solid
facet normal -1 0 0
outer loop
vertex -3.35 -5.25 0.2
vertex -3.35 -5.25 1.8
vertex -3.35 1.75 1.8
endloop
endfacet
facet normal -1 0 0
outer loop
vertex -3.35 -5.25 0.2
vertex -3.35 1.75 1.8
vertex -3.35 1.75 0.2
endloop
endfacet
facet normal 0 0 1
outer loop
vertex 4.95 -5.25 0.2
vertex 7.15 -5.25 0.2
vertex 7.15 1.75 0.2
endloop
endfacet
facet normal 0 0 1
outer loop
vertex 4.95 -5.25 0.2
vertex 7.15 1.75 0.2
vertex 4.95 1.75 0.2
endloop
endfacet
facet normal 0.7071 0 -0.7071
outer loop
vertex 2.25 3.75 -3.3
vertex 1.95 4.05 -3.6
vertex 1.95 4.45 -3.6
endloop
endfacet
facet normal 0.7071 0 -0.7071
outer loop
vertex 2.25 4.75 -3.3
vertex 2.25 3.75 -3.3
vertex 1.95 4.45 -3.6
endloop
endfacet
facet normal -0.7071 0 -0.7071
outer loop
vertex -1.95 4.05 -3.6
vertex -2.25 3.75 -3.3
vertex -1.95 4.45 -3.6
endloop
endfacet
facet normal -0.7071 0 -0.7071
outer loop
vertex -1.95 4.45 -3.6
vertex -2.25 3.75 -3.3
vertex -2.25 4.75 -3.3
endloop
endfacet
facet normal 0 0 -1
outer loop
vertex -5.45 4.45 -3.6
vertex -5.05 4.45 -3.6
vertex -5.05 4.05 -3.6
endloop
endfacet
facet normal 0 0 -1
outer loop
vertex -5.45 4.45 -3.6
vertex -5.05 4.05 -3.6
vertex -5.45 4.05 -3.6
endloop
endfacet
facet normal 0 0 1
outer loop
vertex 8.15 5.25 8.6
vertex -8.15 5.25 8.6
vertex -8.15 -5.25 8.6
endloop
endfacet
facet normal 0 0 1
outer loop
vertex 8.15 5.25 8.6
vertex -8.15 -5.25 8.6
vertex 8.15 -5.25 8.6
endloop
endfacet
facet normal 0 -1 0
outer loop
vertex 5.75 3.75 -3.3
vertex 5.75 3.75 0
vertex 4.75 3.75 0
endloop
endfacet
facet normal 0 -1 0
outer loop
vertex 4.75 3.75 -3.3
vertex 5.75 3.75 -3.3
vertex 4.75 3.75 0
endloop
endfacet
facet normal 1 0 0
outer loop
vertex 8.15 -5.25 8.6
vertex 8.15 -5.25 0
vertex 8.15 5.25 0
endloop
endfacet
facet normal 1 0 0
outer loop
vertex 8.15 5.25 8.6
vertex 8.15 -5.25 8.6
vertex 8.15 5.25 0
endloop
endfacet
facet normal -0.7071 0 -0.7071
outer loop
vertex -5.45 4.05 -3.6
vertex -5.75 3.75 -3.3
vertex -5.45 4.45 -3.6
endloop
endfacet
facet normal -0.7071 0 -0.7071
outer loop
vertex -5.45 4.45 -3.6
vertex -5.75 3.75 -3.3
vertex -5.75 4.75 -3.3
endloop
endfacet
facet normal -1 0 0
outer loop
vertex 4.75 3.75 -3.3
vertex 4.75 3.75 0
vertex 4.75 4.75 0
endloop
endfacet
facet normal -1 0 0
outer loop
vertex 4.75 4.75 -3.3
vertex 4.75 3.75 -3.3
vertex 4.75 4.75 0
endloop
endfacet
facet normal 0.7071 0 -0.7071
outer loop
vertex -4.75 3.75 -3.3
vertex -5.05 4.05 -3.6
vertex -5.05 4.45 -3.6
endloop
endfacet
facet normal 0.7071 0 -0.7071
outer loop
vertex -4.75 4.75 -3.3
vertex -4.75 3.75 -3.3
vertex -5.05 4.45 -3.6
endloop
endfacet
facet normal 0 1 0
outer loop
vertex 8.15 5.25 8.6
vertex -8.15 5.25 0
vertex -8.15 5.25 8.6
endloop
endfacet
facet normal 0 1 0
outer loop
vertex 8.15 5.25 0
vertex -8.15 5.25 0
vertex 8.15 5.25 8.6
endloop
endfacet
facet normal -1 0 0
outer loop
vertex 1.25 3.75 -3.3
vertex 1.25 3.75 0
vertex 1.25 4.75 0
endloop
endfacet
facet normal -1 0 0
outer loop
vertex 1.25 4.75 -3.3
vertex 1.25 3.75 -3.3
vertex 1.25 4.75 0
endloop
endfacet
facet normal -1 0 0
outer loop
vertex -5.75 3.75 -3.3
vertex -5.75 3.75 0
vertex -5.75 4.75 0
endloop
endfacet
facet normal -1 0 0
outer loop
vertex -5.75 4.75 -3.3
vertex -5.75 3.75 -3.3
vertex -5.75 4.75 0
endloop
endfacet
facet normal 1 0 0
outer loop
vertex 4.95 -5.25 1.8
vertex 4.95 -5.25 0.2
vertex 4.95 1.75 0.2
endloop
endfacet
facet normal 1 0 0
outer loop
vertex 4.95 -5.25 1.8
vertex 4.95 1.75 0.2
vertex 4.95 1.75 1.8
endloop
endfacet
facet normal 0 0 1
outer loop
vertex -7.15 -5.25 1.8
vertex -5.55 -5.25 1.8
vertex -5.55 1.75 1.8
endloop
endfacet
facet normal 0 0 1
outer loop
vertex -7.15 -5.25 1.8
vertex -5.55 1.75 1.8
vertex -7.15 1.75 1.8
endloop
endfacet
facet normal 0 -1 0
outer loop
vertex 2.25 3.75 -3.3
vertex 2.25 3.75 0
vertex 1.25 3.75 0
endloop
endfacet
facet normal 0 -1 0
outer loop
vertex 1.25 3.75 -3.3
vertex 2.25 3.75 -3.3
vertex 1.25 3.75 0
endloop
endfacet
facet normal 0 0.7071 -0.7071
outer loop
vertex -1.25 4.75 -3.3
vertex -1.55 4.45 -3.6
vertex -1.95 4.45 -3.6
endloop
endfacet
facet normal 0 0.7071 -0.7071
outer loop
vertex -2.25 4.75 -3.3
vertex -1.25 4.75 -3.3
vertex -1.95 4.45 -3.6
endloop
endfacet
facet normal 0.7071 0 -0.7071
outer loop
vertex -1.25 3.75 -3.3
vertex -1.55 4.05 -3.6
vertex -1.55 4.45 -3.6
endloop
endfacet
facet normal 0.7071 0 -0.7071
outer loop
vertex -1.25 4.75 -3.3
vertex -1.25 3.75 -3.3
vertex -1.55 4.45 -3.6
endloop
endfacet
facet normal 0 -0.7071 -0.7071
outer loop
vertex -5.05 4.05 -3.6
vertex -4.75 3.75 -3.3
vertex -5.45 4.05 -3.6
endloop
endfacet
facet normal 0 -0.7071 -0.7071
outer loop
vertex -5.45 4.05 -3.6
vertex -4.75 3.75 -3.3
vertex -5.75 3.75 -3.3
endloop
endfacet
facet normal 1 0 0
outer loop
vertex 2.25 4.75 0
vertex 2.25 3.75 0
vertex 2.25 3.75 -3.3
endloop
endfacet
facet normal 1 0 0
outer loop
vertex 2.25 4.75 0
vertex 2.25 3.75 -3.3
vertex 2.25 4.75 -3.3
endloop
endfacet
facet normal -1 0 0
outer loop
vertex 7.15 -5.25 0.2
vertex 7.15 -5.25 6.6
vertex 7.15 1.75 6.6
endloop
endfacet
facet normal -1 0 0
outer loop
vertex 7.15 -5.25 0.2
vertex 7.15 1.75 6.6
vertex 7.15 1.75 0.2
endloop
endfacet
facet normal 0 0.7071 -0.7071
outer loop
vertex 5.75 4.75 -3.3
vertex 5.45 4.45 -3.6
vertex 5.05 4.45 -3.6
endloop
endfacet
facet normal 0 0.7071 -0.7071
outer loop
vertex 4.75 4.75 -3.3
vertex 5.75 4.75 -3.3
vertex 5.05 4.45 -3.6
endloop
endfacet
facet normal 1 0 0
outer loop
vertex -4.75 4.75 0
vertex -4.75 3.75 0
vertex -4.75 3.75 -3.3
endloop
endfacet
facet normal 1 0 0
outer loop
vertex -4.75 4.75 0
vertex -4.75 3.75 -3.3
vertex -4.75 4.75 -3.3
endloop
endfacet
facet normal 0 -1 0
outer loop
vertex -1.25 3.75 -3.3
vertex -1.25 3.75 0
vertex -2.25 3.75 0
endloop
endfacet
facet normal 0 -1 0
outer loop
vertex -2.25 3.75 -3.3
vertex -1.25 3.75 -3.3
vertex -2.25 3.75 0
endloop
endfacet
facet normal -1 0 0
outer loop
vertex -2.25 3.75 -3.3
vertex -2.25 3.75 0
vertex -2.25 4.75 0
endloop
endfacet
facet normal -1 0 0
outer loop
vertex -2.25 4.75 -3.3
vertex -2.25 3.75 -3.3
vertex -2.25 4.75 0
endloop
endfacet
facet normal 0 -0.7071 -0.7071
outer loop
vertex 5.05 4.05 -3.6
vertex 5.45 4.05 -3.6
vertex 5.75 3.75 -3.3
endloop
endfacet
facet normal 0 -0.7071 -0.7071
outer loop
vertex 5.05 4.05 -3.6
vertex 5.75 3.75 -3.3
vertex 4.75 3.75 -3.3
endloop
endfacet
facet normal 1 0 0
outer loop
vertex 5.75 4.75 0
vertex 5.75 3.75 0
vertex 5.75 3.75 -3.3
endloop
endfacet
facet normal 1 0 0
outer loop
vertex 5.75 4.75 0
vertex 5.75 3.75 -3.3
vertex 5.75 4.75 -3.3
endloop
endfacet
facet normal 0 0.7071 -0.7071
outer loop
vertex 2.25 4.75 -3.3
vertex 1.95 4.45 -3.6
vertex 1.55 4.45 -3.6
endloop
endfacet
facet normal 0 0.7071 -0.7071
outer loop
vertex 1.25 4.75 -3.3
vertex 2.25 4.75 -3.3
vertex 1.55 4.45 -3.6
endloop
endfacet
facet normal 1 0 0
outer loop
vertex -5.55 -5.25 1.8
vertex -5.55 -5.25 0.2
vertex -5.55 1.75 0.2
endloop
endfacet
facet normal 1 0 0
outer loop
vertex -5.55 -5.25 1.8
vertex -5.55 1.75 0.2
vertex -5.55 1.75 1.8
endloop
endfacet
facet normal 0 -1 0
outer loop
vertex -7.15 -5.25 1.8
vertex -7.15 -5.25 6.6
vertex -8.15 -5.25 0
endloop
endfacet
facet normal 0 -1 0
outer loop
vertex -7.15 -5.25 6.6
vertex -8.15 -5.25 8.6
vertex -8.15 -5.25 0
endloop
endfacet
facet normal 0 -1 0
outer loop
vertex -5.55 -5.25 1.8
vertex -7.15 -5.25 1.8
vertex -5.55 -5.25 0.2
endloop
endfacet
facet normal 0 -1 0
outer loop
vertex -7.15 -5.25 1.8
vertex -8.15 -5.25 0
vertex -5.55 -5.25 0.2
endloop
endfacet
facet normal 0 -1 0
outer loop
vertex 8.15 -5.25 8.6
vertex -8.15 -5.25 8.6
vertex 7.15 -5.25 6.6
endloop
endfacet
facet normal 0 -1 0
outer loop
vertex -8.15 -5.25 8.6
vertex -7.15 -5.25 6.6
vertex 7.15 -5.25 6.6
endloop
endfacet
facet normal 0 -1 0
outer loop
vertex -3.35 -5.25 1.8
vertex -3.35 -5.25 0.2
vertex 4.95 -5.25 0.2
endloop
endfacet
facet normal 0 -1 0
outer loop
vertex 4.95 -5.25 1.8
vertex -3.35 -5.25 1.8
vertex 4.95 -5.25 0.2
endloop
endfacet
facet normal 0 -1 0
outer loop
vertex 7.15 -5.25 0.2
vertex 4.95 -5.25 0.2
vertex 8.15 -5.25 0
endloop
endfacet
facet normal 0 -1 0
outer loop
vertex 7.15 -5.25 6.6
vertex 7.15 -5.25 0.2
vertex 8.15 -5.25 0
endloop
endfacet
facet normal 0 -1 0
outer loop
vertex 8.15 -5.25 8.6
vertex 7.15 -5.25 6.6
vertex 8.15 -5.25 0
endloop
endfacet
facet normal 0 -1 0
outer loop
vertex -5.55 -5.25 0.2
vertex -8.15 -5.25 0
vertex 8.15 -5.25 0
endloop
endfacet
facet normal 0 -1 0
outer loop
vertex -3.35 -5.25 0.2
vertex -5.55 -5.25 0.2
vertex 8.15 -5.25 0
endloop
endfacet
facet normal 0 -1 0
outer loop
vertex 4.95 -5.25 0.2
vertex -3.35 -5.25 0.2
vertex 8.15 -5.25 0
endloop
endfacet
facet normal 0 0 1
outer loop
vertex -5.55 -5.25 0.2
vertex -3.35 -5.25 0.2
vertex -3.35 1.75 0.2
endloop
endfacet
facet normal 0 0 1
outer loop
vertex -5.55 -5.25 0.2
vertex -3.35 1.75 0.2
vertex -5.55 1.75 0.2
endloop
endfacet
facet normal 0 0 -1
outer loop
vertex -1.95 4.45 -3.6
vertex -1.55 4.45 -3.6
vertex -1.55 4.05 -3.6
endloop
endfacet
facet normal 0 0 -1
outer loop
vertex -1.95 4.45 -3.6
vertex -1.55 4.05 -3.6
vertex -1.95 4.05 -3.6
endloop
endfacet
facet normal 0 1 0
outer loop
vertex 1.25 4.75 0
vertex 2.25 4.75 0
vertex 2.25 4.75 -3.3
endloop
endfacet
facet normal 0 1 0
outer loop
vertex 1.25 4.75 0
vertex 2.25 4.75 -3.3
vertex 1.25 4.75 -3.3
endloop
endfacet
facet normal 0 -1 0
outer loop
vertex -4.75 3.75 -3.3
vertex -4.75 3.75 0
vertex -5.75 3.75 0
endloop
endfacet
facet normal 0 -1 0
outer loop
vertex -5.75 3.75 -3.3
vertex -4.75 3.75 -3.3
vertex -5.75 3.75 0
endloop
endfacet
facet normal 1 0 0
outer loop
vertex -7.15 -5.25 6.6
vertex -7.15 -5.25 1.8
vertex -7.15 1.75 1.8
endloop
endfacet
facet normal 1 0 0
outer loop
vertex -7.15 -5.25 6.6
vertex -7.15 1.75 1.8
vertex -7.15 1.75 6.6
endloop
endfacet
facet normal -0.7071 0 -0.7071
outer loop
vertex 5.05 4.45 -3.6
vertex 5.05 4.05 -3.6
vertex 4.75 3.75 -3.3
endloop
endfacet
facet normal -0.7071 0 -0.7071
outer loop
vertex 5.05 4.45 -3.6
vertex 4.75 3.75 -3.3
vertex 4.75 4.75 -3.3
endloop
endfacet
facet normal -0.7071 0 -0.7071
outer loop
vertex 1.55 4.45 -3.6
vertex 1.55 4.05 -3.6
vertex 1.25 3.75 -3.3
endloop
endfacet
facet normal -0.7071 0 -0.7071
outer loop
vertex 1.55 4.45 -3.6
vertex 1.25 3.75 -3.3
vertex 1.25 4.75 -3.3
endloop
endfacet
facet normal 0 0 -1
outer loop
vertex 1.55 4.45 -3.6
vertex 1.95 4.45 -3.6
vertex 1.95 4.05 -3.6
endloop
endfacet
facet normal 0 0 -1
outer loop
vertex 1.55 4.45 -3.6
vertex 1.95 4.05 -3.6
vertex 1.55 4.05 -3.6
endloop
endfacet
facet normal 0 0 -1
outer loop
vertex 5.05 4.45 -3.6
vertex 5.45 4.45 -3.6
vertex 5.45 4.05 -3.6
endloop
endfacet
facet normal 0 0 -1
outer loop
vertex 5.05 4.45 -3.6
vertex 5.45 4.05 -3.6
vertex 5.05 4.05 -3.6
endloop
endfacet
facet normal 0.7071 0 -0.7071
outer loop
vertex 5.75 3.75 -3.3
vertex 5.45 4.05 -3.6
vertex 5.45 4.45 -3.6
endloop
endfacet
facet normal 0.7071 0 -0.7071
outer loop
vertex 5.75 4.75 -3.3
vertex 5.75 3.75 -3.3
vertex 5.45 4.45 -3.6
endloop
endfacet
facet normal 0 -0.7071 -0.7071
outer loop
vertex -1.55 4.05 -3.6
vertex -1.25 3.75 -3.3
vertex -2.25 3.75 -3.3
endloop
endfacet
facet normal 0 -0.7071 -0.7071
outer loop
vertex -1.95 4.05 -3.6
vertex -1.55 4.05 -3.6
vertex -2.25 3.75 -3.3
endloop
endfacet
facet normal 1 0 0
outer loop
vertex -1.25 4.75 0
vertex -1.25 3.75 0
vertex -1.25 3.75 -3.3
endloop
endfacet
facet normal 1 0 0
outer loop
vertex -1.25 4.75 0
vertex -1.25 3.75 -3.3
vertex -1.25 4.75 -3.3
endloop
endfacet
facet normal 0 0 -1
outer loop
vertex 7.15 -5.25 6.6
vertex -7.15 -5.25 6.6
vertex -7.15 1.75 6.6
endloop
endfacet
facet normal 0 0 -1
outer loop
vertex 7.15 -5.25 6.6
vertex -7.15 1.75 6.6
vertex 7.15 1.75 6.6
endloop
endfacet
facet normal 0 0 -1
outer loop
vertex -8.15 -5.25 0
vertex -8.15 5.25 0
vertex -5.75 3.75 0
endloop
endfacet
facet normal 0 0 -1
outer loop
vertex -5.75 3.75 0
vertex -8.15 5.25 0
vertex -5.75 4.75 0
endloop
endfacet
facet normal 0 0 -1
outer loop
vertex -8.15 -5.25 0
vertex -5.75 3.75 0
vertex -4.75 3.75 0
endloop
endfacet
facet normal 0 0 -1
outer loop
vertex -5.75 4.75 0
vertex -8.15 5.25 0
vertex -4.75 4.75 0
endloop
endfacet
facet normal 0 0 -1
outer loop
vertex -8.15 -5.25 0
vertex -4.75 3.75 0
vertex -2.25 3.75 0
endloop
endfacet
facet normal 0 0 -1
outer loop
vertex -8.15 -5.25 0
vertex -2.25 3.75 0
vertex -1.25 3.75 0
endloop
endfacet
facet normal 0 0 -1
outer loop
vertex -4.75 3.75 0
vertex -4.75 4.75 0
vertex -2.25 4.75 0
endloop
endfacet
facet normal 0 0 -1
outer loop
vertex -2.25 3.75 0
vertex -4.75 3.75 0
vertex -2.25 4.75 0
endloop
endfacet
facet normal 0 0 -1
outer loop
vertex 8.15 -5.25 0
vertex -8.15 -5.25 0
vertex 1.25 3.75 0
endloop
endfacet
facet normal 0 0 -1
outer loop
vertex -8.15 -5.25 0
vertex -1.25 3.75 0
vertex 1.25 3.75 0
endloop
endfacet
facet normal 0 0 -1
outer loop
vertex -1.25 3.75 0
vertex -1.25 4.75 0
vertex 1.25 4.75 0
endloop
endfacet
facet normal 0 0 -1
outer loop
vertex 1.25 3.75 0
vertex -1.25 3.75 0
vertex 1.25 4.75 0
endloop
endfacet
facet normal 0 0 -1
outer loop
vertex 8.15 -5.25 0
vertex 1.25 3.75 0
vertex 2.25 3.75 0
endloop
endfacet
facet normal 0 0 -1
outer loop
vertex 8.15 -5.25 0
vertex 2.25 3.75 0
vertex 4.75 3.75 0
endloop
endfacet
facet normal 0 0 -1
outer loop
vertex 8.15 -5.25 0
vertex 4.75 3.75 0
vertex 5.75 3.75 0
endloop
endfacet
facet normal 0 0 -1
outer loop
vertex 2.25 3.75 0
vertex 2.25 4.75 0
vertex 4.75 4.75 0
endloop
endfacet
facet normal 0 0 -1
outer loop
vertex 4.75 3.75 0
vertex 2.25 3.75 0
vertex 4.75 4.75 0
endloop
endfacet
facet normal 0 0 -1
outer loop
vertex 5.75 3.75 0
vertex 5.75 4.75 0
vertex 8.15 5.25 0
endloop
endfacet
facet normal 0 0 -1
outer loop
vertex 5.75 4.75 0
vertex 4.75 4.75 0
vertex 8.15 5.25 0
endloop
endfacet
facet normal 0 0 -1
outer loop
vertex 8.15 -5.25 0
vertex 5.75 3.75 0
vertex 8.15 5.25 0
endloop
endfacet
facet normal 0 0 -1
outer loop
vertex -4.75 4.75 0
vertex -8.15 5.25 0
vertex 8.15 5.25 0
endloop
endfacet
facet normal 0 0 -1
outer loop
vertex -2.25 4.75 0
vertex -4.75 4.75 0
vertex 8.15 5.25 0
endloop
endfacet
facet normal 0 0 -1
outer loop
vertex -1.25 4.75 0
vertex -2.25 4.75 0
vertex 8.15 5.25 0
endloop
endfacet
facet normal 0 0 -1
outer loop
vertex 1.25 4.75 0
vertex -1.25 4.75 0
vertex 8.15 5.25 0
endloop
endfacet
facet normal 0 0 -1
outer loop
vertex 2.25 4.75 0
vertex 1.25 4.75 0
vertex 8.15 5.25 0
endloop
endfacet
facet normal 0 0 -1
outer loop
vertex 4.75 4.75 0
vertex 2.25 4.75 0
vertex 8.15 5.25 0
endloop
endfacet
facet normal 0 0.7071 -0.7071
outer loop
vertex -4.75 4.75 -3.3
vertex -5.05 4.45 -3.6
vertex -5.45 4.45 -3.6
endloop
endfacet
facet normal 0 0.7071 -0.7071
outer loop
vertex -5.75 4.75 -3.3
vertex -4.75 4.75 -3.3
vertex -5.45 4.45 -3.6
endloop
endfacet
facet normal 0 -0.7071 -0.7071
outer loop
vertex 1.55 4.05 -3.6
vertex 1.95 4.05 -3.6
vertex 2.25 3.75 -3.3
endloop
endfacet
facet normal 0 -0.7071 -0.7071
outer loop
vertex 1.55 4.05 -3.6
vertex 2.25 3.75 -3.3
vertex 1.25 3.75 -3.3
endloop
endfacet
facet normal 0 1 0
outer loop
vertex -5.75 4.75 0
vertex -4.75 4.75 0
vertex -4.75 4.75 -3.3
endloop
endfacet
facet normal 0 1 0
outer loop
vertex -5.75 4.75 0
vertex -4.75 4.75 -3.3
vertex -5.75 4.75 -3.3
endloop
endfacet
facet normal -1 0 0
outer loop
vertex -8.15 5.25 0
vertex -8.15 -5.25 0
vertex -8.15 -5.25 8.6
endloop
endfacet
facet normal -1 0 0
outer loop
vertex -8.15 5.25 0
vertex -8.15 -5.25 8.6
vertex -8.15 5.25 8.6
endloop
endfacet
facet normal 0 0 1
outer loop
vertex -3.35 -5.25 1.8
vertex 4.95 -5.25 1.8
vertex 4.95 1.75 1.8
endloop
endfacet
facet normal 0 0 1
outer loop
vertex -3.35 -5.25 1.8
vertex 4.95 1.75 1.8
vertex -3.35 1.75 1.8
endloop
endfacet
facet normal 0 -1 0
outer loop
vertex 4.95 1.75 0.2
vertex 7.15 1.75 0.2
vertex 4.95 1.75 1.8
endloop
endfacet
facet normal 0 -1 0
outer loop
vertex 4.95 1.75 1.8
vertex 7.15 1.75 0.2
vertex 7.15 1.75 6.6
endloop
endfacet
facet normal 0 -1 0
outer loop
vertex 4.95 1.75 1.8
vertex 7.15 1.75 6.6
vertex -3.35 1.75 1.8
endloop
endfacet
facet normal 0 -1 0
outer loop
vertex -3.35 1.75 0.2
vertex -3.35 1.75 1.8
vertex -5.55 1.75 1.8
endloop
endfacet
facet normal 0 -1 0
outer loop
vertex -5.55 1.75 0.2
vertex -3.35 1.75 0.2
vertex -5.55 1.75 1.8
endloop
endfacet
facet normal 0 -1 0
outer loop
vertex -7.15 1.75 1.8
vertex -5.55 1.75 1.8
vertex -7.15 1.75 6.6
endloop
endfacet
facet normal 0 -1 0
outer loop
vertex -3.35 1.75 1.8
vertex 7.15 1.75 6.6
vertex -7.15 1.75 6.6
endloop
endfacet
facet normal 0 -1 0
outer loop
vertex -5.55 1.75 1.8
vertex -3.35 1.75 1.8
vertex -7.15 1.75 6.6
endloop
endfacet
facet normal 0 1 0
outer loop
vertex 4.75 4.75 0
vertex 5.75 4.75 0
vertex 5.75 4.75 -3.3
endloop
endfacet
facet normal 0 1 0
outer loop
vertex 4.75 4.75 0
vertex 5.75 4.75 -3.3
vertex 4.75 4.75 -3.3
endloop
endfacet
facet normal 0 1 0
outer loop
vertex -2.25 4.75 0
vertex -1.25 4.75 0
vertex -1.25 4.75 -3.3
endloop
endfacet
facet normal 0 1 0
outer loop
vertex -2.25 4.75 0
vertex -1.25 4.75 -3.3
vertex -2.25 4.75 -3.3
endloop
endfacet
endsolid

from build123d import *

# Parameters (mm, degrees)
SKETCH_1_W                         = 16.3
SKETCH_1_H                         = 10.5
EXTRUDE_1_DEPTH                    = 8.6
CUT_EXTRUDE_1_DEPTH                = 7
EXTRUDE_START                      = -5
SKETCH_3_W                         = 1
SKETCH_3_H                         = 1
EXTRUDE_2_DEPTH                    = 8.6
CHAMFER_1_SIZE                     = 0.3
PATTERN_LINEAR_1_COUNT             = 4
PATTERN_LINEAR_1_PITCH             = 3.5
CHAMFER_1_OF_PATTERN_LINEAR_1_SIZE = 0.3


with BuildPart() as part:
    # Эскиз1 → Бобышка-Вытянуть1 (new body)
    with BuildSketch(Plane.XY):
        Rectangle(SKETCH_1_W, SKETCH_1_H)
    extrude(amount=EXTRUDE_1_DEPTH)

    # Эскиз2 → Вырез-Вытянуть1 (cut)
    with BuildSketch(Plane.XZ.offset(5.25)):
        Polygon((-7.15, 6.6), (7.15, 6.6), (7.15, 0.2), (4.95, 0.2), (4.95, 1.8), (-3.35, 1.8), (-3.35, 0.2), (-5.55, 0.2), (-5.55, 1.8), (-7.15, 1.8), align=None)
    extrude(amount=-CUT_EXTRUDE_1_DEPTH, mode=Mode.SUBTRACT)

    # Эскиз3 → Бобышка-Вытянуть2 (add)
    with BuildSketch(Plane(origin=(0, 0, 0), x_dir=(-1, 0, 0), z_dir=(0, 0, -1)).offset(EXTRUDE_START)):
        with Locations((5.25, 4.25)):
            Rectangle(SKETCH_3_W, SKETCH_3_H)
    extrude_2 = extrude(amount=EXTRUDE_2_DEPTH)

    # Фаска1
    chamfer_1_edges = [part.edges().sort_by_distance(p)[0] for p in [
        (-4.75, 4.25, -3.6),
        (-5.25, 3.75, -3.6),
        (-5.75, 4.25, -3.6),
        (-5.25, 4.75, -3.6),
    ]]
    chamfer(chamfer_1_edges, length=CHAMFER_1_SIZE)

    # Линейный массив1: Бобышка-Вытянуть2 ×4
    with Locations(*[(i * PATTERN_LINEAR_1_PITCH, 0, 0) for i in range(1, PATTERN_LINEAR_1_COUNT)]):
        add(extrude_2)

    # Фаска1 of Линейный массив1
    chamfer_1_of_pattern_linear_1_edges = [part.edges().sort_by_distance(p)[0] for p in [
        (-1.25, 4.25, -3.6),
        (-1.75, 3.75, -3.6),
        (-2.25, 4.25, -3.6),
        (-1.75, 4.75, -3.6),
        (2.25, 4.25, -3.6),
        (1.75, 3.75, -3.6),
        (1.25, 4.25, -3.6),
        (1.75, 4.75, -3.6),
        (5.75, 4.25, -3.6),
        (5.25, 3.75, -3.6),
        (4.75, 4.25, -3.6),
        (5.25, 4.75, -3.6),
    ]]
    chamfer(chamfer_1_of_pattern_linear_1_edges, length=CHAMFER_1_OF_PATTERN_LINEAR_1_SIZE)


solid = part.part
